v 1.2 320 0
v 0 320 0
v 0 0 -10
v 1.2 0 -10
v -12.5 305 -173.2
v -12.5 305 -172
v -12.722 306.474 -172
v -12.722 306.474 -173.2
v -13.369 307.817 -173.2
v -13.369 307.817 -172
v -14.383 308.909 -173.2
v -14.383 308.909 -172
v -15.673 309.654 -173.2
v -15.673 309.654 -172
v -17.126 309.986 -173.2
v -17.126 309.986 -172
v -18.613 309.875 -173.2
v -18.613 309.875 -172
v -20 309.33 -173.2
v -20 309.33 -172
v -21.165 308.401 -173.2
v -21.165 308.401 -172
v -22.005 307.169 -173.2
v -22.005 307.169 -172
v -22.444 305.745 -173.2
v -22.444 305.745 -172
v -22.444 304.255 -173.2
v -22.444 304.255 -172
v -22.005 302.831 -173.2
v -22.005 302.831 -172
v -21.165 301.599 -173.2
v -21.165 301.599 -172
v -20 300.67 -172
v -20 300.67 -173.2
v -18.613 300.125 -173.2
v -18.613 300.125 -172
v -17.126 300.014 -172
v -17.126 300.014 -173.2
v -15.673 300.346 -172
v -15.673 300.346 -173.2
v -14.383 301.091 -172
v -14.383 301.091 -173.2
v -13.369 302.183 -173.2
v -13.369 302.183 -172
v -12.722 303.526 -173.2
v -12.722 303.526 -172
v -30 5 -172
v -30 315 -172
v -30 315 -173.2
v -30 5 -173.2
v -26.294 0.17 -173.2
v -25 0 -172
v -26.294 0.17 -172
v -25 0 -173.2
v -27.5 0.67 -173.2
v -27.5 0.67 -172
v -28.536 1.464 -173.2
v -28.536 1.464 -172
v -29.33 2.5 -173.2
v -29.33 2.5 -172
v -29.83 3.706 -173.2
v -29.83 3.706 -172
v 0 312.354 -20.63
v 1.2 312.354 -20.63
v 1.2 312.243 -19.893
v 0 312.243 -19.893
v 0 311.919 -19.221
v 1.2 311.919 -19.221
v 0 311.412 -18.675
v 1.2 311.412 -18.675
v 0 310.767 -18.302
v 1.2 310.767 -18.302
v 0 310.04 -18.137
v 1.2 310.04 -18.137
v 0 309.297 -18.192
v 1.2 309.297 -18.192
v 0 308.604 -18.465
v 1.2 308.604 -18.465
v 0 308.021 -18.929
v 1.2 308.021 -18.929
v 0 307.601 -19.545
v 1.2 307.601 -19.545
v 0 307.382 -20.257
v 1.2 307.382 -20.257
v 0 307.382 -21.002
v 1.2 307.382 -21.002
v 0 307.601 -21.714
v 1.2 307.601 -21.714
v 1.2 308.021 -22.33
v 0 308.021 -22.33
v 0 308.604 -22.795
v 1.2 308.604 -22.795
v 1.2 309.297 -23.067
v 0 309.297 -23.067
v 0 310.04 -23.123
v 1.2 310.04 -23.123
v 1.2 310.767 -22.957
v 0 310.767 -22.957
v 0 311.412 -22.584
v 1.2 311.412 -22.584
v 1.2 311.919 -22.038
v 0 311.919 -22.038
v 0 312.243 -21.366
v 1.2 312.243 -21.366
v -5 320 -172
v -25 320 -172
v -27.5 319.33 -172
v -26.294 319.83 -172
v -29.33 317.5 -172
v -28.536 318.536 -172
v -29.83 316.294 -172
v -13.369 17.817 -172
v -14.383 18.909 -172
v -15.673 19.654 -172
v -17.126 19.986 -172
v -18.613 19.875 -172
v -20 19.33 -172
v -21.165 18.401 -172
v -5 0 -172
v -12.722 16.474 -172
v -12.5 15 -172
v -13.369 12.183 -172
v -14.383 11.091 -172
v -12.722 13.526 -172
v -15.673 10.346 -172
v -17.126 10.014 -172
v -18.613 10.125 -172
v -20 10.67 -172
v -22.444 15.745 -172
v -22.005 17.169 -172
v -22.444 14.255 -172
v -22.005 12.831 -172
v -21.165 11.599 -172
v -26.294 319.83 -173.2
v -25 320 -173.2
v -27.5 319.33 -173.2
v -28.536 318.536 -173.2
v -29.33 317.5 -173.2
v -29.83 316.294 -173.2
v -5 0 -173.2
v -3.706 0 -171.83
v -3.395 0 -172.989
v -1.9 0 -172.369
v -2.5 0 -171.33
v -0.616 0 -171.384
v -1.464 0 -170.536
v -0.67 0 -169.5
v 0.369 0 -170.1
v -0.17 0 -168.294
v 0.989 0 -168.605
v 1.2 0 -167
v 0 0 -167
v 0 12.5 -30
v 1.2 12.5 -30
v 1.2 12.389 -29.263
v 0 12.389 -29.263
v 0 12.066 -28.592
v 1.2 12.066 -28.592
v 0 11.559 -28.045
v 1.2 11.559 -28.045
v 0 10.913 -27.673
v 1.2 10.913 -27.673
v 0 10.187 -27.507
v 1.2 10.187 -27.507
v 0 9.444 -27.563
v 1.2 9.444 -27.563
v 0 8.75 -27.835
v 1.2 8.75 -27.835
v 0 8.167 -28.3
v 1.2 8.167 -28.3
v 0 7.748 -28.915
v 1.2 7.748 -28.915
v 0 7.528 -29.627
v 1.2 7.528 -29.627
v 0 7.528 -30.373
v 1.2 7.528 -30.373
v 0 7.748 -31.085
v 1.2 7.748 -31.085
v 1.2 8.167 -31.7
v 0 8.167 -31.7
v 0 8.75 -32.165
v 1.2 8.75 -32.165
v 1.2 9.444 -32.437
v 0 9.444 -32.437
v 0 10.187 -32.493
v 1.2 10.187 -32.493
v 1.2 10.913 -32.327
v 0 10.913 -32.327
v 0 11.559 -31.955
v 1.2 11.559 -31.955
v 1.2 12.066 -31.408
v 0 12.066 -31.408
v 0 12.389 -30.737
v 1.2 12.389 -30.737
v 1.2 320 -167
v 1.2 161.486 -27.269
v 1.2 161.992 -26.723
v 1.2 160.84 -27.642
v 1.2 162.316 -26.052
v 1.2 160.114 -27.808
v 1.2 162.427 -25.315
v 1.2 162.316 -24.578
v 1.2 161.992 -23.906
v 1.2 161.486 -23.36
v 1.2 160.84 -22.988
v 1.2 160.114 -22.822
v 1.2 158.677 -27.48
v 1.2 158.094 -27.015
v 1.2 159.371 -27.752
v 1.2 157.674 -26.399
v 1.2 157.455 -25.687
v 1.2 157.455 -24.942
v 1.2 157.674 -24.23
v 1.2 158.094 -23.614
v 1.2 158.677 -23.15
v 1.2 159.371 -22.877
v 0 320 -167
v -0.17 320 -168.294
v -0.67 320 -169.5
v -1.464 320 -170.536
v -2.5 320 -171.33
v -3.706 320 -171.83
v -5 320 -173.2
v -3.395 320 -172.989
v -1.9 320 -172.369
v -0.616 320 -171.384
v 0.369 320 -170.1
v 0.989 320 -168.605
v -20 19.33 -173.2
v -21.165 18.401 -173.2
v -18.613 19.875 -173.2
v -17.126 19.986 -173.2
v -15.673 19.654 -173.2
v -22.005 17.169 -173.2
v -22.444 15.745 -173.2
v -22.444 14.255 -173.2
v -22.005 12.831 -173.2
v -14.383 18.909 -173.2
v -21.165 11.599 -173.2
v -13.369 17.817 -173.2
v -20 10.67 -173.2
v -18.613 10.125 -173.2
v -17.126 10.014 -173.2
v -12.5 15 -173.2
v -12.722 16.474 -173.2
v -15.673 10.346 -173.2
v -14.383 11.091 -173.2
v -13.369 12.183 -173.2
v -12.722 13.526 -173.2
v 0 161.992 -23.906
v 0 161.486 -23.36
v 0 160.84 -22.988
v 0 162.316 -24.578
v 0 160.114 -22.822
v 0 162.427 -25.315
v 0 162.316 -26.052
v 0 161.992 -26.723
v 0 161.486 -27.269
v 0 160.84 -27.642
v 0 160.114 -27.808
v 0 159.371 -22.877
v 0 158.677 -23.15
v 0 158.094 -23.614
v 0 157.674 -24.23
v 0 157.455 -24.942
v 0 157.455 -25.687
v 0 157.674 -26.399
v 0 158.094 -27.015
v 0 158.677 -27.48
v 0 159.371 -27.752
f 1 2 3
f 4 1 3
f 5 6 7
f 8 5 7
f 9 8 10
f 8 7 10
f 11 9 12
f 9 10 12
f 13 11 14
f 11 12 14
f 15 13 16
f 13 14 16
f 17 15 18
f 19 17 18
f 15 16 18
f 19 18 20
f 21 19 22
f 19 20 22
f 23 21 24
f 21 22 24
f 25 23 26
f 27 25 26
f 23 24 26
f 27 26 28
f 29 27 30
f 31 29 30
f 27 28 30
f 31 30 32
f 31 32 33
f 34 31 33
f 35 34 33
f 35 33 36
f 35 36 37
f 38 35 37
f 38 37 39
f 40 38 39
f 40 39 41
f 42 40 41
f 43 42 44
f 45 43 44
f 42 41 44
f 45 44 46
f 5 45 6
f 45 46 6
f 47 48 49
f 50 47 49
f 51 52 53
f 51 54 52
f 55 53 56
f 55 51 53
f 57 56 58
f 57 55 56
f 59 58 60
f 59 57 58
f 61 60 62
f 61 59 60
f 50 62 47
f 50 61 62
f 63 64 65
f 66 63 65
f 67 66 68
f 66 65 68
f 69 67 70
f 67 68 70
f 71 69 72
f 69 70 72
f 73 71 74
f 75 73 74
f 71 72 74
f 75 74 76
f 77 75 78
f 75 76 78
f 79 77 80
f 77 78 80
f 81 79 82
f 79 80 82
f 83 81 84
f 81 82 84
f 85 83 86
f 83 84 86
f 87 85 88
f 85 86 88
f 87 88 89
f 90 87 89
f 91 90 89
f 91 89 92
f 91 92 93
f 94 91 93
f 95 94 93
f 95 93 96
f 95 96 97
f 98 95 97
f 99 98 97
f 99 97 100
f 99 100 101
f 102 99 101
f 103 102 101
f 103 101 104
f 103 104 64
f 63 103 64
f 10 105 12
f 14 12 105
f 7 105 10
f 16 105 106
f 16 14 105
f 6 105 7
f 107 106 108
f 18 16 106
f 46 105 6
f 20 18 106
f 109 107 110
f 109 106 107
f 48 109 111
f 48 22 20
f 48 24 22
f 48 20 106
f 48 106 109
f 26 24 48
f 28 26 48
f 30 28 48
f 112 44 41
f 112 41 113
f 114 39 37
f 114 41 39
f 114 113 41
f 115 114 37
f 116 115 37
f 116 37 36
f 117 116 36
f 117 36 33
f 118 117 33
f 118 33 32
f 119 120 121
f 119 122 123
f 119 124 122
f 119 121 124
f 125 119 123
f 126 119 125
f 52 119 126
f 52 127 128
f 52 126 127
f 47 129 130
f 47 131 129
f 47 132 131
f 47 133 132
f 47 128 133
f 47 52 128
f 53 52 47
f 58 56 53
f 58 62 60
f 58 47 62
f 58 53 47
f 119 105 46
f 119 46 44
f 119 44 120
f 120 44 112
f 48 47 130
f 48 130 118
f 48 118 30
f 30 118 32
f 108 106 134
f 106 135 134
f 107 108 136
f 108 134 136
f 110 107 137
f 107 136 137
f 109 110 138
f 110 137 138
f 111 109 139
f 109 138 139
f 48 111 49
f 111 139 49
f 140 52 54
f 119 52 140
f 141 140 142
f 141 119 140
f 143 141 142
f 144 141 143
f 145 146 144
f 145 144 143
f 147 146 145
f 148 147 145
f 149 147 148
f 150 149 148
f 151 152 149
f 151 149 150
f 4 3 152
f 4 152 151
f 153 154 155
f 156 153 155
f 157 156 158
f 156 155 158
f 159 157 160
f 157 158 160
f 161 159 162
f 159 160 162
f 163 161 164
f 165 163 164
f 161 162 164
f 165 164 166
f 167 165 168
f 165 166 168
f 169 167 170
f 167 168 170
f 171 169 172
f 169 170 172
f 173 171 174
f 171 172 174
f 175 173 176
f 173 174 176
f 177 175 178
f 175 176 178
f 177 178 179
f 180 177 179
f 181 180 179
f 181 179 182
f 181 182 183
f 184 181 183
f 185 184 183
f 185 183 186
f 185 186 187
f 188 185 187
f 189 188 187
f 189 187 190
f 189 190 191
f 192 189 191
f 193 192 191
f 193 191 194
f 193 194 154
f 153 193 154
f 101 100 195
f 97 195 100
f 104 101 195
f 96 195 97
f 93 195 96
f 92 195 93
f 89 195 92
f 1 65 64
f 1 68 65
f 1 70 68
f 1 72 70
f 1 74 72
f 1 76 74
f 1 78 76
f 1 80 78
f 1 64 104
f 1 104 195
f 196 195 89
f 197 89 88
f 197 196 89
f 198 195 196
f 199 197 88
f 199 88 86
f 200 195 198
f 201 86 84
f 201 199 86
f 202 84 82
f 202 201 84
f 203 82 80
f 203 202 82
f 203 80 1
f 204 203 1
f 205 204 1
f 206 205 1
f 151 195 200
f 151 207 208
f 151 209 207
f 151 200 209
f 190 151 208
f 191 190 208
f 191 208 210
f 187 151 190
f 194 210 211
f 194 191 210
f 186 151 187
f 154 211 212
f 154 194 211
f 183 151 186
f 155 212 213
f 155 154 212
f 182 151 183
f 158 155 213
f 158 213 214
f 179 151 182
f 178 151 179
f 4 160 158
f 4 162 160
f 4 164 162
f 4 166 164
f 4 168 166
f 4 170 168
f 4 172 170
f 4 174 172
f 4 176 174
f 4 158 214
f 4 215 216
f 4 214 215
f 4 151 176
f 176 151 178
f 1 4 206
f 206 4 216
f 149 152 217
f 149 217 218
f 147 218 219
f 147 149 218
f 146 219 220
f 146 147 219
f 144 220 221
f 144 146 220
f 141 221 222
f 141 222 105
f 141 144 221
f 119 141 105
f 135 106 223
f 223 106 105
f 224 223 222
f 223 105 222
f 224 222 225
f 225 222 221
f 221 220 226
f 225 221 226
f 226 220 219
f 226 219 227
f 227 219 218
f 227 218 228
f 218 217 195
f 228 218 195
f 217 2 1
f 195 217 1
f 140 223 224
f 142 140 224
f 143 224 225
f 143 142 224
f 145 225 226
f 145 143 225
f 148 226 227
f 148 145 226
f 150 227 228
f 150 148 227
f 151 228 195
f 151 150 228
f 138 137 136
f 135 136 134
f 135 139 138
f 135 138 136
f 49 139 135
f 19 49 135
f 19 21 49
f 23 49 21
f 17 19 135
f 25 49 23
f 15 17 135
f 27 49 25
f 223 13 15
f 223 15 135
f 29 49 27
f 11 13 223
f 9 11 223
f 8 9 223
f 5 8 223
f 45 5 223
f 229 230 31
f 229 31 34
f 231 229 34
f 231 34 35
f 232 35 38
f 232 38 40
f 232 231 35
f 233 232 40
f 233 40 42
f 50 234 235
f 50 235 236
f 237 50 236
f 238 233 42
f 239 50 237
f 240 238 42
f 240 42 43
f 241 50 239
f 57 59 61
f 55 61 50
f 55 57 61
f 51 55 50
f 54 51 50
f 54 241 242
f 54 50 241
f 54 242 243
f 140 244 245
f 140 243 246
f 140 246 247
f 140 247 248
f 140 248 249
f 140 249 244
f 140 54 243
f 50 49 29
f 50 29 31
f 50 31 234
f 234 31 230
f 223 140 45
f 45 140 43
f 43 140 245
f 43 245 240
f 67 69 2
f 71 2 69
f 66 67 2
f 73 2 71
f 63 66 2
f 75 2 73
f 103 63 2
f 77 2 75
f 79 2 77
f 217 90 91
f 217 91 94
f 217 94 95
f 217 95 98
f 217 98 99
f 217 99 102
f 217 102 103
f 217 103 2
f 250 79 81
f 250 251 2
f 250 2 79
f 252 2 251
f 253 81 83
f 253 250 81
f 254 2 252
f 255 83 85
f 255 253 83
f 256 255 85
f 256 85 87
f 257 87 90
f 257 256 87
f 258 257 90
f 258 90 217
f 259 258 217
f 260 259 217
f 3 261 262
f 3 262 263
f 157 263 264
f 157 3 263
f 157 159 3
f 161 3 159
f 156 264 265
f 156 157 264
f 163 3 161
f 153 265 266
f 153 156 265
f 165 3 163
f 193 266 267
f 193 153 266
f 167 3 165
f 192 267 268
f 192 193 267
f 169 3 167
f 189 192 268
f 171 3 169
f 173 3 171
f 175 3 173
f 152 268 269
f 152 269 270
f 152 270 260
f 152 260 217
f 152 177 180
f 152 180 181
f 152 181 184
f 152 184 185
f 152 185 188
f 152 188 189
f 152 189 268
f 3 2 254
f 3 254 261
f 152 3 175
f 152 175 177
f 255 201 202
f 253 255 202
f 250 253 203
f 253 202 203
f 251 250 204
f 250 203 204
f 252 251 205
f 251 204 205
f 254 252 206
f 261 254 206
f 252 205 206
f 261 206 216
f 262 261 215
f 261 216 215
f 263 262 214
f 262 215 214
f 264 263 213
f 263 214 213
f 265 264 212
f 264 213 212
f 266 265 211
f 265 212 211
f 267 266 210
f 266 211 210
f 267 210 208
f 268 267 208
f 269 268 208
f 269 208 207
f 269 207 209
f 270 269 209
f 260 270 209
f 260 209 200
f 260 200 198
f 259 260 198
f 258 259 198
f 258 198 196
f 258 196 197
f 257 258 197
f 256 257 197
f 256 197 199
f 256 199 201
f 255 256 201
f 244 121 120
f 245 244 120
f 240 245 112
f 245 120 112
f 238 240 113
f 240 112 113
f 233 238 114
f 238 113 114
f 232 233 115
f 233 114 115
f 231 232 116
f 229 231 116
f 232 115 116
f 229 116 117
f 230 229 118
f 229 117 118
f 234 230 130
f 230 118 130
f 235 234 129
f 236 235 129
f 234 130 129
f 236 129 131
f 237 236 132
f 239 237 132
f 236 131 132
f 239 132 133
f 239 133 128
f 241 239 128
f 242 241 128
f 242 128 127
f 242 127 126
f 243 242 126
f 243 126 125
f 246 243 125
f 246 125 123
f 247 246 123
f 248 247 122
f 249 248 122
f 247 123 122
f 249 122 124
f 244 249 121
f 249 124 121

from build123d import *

# Parameters (mm, degrees)
F1_DEPTH = 320
F2_R     = 5
F3_DEPTH = 1.2
F4_R     = 5
F6_DEPTH = 1.2
F7_R     = 2.5
F8_DEPTH = 2


with BuildPart() as f1:
    # F0 (on Front) → F1 (new body)
    with BuildSketch(Plane.XZ):
        with BuildLine():
            Line((1.2, 0), (0, 0))
            Line((0, 0), (0, -167))
            ThreePointArc((0, -167), (-1.464466, -170.535534), (-5, -172))
            Line((-5, -172), (-30, -172))
            Line((-30, -172), (-30, -173.2))
            Line((-30, -173.2), (-5, -173.2))
            ThreePointArc((-5, -173.2), (-0.615938, -171.384062), (1.2, -167))
            Line((1.2, -167), (1.2, 0))
        make_face()
    extrude(amount=-F1_DEPTH)

    # F2 (on face) → F3 (cut, through all)
    with BuildSketch(Plane.XY.offset(-172)):
        with Locations((-17.5, 305)):
            Circle(F2_R)
        with Locations((-17.5, 15)):
            Circle(F2_R)
    extrude(amount=-F3_DEPTH, mode=Mode.SUBTRACT)

    # F4
    f4_edges = [f1.edges().sort_by_distance(p)[0] for p in [
        (-30, 320, -172.6),
        (-30, 0, -172.6),
    ]]
    fillet(f4_edges, radius=F4_R)

    # F5 (on face) → F6 (cut, through all)
    with BuildSketch(Plane(origin=(0, 0, 0), x_dir=(0, -1, 0), z_dir=(-1, 0, 0))):
        Polygon((0, 0), (-320, 0), (0, -10), align=None)
    extrude(amount=-F6_DEPTH, mode=Mode.SUBTRACT)

    # F7 (on face) → F8 (cut)
    with BuildSketch(Plane.YZ.offset(1.2)):
        with Locations((10, -30)):
            Circle(F7_R)
        with Locations((159.926811, -25.314787)):
            Circle(F7_R)
        with Locations((309.853623, -20.629574)):
            Circle(F7_R)
    extrude(amount=-F8_DEPTH, mode=Mode.SUBTRACT)


solid = f1.part
